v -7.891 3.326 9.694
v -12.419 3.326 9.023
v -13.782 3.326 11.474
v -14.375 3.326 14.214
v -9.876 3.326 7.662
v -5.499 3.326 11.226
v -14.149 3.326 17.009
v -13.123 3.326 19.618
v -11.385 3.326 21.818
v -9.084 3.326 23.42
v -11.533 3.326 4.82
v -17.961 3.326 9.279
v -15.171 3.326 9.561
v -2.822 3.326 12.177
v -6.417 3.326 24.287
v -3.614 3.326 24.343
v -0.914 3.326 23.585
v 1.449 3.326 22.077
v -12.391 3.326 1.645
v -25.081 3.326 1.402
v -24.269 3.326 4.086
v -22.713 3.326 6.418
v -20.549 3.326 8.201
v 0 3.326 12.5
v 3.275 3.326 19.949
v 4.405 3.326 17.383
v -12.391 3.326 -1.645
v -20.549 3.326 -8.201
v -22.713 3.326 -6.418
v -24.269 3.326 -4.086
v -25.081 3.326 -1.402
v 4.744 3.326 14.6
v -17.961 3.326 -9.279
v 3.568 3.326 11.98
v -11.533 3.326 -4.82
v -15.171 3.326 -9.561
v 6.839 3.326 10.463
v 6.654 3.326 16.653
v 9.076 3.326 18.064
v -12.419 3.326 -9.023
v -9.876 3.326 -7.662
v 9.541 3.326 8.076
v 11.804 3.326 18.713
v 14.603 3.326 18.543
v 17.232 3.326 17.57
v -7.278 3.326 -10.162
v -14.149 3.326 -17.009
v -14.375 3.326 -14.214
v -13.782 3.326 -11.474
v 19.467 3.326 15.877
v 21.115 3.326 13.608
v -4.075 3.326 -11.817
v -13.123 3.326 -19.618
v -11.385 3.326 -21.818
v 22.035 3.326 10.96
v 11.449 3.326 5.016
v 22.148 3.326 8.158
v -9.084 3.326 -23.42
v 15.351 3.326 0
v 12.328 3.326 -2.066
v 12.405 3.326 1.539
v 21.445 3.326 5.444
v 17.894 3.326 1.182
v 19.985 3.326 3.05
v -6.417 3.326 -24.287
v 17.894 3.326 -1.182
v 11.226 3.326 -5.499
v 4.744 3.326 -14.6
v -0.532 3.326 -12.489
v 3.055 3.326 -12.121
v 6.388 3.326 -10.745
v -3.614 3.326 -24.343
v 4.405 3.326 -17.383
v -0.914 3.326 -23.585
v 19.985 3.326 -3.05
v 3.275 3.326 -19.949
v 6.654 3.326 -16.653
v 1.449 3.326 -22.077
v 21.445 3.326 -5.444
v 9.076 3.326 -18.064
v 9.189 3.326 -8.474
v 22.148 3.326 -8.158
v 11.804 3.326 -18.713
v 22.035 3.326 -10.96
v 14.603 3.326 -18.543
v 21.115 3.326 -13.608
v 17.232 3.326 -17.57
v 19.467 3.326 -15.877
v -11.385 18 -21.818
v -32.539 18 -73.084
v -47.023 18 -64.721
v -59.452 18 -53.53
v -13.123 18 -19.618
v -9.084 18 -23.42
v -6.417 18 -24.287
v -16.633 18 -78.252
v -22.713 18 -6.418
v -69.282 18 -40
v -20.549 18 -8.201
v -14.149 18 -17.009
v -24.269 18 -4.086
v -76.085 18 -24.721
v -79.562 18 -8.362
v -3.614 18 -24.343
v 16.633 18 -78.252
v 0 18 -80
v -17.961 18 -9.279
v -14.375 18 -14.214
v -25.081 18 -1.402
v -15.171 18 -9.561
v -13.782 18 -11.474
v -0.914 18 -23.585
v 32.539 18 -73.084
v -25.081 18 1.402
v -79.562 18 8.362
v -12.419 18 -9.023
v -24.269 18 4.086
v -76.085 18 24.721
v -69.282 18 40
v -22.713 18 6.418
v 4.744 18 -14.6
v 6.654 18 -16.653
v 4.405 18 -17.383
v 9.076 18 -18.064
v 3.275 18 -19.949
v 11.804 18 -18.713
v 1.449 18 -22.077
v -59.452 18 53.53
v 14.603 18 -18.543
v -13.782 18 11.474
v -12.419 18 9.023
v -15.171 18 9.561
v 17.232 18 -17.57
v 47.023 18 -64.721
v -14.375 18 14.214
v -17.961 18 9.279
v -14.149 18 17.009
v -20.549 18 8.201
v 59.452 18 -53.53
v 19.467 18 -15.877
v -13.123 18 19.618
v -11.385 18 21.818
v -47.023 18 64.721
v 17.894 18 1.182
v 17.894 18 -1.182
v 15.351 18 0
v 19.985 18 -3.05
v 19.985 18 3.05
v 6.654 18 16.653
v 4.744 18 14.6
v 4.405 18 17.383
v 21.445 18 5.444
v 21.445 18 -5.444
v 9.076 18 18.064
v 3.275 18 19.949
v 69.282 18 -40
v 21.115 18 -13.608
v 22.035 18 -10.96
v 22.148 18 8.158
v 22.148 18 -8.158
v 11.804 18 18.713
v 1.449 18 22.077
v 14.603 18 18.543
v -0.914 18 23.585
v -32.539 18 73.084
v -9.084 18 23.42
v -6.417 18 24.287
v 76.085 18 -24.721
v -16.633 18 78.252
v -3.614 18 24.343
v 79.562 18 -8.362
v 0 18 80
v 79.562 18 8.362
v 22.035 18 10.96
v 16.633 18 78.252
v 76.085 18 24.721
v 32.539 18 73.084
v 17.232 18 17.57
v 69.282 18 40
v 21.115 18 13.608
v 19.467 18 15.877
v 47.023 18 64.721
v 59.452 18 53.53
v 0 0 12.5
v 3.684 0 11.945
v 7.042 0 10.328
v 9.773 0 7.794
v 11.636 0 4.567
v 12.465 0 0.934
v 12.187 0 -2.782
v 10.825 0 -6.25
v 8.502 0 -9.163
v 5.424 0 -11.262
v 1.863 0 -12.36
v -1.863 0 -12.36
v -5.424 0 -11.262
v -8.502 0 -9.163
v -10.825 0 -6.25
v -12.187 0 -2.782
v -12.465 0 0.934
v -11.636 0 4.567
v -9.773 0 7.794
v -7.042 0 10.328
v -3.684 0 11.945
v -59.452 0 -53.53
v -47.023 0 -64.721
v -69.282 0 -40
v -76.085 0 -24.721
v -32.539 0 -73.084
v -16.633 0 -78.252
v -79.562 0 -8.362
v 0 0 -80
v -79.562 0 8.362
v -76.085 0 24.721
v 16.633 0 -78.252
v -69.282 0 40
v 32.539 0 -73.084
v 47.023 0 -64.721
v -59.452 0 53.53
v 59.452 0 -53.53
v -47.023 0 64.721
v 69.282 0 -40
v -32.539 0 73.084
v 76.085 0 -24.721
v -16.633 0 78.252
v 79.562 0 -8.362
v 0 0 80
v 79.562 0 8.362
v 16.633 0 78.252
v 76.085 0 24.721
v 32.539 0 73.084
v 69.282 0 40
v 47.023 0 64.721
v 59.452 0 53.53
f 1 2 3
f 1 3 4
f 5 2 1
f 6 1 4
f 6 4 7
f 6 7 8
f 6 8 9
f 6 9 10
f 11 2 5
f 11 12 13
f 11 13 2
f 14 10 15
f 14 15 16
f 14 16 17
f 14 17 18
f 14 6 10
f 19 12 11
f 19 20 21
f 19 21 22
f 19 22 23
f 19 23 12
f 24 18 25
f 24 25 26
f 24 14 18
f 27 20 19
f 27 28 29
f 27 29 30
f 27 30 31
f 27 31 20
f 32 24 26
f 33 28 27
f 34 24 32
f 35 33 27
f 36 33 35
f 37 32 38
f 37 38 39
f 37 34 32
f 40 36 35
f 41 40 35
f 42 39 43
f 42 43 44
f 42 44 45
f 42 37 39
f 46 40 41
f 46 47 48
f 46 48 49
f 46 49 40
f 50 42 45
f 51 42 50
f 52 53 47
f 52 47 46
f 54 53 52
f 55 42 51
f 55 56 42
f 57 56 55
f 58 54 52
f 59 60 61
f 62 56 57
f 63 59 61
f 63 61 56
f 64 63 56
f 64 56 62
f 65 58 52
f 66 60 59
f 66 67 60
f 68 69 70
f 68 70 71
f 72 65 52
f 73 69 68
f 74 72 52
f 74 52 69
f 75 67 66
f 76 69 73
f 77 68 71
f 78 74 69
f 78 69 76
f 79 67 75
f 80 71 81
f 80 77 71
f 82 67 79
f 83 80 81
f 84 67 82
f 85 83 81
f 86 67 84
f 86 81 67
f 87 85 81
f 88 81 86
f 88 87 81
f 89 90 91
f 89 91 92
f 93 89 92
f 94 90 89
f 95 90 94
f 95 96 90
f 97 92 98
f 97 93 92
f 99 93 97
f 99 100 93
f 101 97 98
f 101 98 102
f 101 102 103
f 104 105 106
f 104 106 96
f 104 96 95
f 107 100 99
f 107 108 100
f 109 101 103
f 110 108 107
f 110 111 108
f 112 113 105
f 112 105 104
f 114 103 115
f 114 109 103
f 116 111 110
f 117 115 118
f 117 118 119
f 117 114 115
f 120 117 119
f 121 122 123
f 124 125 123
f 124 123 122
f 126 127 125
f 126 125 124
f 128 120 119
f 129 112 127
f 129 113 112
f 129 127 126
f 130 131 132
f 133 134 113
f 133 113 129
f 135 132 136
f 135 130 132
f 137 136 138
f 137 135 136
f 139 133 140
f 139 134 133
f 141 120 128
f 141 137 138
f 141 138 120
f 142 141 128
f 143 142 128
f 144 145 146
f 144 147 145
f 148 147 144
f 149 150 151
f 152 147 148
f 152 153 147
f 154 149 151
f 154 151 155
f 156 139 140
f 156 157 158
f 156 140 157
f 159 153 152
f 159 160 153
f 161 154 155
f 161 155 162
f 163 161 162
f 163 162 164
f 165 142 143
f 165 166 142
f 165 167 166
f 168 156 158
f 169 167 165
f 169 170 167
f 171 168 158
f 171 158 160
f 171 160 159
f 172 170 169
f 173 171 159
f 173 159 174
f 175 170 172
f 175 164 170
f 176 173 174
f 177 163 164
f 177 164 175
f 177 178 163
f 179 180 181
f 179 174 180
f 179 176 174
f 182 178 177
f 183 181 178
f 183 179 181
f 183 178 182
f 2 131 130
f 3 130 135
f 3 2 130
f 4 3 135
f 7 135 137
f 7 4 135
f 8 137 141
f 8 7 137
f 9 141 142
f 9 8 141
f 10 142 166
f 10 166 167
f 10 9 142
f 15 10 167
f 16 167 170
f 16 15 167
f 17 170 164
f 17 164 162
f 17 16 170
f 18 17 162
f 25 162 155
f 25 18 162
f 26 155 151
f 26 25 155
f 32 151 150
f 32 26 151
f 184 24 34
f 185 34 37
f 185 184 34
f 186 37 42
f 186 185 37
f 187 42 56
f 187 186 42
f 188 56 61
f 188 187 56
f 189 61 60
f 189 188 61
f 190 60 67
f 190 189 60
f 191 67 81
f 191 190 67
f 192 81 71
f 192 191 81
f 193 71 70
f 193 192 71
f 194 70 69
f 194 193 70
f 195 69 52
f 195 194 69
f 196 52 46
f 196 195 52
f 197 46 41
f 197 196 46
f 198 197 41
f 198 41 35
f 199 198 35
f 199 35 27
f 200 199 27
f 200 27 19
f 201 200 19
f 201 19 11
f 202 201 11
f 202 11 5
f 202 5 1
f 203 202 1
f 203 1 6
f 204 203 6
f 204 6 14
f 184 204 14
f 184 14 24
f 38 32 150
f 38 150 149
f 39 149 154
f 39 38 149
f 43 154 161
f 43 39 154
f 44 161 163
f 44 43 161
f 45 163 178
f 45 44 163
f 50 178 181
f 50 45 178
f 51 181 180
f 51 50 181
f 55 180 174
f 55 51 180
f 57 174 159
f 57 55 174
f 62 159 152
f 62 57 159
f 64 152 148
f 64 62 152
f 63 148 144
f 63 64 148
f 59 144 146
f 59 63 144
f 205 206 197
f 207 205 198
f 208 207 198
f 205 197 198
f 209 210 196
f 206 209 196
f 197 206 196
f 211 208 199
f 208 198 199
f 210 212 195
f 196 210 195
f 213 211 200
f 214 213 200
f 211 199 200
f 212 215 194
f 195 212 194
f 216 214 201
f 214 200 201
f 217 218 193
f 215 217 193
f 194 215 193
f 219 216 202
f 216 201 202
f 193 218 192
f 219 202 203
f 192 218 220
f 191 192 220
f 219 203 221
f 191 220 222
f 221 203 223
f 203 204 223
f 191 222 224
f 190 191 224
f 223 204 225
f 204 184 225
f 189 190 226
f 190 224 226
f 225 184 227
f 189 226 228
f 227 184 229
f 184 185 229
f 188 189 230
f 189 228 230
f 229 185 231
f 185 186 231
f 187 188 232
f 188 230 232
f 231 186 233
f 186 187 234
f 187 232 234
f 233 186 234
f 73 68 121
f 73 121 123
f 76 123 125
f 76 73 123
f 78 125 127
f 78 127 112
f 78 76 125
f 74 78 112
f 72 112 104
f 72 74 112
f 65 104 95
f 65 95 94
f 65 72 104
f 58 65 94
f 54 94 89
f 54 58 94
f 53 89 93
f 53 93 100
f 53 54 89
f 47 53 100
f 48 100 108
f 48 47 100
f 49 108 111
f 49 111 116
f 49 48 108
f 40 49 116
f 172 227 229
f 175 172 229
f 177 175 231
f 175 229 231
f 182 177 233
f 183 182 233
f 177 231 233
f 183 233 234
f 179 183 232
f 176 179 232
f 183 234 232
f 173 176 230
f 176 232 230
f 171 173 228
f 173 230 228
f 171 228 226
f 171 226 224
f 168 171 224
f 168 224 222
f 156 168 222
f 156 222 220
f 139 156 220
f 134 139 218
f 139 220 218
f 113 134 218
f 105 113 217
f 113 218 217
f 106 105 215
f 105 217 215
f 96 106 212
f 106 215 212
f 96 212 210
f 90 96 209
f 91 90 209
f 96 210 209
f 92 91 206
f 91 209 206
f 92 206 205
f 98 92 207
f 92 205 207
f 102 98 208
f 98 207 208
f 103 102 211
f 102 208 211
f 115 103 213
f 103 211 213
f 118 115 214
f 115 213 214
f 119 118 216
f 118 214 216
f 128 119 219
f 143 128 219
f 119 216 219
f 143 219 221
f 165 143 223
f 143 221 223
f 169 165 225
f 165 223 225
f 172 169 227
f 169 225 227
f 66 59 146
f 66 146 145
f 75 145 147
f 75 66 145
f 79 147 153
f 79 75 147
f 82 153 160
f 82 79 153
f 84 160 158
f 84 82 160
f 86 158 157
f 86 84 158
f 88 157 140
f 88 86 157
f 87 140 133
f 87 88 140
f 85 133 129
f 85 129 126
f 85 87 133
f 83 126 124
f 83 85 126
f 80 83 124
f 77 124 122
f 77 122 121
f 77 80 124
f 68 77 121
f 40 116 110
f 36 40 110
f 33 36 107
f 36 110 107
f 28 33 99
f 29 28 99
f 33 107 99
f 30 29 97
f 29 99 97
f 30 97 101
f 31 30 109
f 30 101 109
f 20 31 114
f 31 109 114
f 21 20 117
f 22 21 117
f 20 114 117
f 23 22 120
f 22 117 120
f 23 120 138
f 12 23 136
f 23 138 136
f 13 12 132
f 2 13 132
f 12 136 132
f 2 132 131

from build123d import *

# Parameters (mm, degrees)
SKETCH1_R           = 80
BOSS_EXTRUDE1_DEPTH = 18
SKETCH2_R           = 12.5
CUT_EXTRUDE1_DEPTH  = 115.560027933
SKETCH3_R           = 9.571617906
CUT_EXTRUDE2_DEPTH  = 14.673865943
CIRPATTERN1_COUNT   = 5


with BuildPart() as part:
    # Sketch1 → Boss-Extrude1 (new body)
    with BuildSketch(Plane(origin=(0, 0, 0), x_dir=(1, 0, 0), z_dir=(0, 1, 0))):
        Circle(SKETCH1_R)
    extrude(amount=BOSS_EXTRUDE1_DEPTH)

    # Sketch2 → Cut-Extrude1 (cut, through all)
    with BuildSketch(Plane(origin=(0, 0, 0), x_dir=(1, 0, 0), z_dir=(0, 1, 0))):
        Circle(SKETCH2_R)
    extrude(amount=CUT_EXTRUDE1_DEPTH, mode=Mode.SUBTRACT)

    # Sketch3 → Cut-Extrude2 (cut)
    with BuildSketch(Plane(origin=(0, 18, 0), x_dir=(1, 0, 0), z_dir=(0, 1, 0))):
        with Locations((-15.612808267, 0)):
            Circle(SKETCH3_R)
    cut_extrude2 = extrude(amount=-CUT_EXTRUDE2_DEPTH, mode=Mode.SUBTRACT)

    # CirPattern1: Cut-Extrude2 ×5 about axis
    cirpattern1_axis = Axis((0, 0, 0), (0, 1, 0))
    for i in range(1, CIRPATTERN1_COUNT):
        add(cut_extrude2.rotate(cirpattern1_axis, i * 360 / CIRPATTERN1_COUNT), mode=Mode.SUBTRACT)


solid = part.part
